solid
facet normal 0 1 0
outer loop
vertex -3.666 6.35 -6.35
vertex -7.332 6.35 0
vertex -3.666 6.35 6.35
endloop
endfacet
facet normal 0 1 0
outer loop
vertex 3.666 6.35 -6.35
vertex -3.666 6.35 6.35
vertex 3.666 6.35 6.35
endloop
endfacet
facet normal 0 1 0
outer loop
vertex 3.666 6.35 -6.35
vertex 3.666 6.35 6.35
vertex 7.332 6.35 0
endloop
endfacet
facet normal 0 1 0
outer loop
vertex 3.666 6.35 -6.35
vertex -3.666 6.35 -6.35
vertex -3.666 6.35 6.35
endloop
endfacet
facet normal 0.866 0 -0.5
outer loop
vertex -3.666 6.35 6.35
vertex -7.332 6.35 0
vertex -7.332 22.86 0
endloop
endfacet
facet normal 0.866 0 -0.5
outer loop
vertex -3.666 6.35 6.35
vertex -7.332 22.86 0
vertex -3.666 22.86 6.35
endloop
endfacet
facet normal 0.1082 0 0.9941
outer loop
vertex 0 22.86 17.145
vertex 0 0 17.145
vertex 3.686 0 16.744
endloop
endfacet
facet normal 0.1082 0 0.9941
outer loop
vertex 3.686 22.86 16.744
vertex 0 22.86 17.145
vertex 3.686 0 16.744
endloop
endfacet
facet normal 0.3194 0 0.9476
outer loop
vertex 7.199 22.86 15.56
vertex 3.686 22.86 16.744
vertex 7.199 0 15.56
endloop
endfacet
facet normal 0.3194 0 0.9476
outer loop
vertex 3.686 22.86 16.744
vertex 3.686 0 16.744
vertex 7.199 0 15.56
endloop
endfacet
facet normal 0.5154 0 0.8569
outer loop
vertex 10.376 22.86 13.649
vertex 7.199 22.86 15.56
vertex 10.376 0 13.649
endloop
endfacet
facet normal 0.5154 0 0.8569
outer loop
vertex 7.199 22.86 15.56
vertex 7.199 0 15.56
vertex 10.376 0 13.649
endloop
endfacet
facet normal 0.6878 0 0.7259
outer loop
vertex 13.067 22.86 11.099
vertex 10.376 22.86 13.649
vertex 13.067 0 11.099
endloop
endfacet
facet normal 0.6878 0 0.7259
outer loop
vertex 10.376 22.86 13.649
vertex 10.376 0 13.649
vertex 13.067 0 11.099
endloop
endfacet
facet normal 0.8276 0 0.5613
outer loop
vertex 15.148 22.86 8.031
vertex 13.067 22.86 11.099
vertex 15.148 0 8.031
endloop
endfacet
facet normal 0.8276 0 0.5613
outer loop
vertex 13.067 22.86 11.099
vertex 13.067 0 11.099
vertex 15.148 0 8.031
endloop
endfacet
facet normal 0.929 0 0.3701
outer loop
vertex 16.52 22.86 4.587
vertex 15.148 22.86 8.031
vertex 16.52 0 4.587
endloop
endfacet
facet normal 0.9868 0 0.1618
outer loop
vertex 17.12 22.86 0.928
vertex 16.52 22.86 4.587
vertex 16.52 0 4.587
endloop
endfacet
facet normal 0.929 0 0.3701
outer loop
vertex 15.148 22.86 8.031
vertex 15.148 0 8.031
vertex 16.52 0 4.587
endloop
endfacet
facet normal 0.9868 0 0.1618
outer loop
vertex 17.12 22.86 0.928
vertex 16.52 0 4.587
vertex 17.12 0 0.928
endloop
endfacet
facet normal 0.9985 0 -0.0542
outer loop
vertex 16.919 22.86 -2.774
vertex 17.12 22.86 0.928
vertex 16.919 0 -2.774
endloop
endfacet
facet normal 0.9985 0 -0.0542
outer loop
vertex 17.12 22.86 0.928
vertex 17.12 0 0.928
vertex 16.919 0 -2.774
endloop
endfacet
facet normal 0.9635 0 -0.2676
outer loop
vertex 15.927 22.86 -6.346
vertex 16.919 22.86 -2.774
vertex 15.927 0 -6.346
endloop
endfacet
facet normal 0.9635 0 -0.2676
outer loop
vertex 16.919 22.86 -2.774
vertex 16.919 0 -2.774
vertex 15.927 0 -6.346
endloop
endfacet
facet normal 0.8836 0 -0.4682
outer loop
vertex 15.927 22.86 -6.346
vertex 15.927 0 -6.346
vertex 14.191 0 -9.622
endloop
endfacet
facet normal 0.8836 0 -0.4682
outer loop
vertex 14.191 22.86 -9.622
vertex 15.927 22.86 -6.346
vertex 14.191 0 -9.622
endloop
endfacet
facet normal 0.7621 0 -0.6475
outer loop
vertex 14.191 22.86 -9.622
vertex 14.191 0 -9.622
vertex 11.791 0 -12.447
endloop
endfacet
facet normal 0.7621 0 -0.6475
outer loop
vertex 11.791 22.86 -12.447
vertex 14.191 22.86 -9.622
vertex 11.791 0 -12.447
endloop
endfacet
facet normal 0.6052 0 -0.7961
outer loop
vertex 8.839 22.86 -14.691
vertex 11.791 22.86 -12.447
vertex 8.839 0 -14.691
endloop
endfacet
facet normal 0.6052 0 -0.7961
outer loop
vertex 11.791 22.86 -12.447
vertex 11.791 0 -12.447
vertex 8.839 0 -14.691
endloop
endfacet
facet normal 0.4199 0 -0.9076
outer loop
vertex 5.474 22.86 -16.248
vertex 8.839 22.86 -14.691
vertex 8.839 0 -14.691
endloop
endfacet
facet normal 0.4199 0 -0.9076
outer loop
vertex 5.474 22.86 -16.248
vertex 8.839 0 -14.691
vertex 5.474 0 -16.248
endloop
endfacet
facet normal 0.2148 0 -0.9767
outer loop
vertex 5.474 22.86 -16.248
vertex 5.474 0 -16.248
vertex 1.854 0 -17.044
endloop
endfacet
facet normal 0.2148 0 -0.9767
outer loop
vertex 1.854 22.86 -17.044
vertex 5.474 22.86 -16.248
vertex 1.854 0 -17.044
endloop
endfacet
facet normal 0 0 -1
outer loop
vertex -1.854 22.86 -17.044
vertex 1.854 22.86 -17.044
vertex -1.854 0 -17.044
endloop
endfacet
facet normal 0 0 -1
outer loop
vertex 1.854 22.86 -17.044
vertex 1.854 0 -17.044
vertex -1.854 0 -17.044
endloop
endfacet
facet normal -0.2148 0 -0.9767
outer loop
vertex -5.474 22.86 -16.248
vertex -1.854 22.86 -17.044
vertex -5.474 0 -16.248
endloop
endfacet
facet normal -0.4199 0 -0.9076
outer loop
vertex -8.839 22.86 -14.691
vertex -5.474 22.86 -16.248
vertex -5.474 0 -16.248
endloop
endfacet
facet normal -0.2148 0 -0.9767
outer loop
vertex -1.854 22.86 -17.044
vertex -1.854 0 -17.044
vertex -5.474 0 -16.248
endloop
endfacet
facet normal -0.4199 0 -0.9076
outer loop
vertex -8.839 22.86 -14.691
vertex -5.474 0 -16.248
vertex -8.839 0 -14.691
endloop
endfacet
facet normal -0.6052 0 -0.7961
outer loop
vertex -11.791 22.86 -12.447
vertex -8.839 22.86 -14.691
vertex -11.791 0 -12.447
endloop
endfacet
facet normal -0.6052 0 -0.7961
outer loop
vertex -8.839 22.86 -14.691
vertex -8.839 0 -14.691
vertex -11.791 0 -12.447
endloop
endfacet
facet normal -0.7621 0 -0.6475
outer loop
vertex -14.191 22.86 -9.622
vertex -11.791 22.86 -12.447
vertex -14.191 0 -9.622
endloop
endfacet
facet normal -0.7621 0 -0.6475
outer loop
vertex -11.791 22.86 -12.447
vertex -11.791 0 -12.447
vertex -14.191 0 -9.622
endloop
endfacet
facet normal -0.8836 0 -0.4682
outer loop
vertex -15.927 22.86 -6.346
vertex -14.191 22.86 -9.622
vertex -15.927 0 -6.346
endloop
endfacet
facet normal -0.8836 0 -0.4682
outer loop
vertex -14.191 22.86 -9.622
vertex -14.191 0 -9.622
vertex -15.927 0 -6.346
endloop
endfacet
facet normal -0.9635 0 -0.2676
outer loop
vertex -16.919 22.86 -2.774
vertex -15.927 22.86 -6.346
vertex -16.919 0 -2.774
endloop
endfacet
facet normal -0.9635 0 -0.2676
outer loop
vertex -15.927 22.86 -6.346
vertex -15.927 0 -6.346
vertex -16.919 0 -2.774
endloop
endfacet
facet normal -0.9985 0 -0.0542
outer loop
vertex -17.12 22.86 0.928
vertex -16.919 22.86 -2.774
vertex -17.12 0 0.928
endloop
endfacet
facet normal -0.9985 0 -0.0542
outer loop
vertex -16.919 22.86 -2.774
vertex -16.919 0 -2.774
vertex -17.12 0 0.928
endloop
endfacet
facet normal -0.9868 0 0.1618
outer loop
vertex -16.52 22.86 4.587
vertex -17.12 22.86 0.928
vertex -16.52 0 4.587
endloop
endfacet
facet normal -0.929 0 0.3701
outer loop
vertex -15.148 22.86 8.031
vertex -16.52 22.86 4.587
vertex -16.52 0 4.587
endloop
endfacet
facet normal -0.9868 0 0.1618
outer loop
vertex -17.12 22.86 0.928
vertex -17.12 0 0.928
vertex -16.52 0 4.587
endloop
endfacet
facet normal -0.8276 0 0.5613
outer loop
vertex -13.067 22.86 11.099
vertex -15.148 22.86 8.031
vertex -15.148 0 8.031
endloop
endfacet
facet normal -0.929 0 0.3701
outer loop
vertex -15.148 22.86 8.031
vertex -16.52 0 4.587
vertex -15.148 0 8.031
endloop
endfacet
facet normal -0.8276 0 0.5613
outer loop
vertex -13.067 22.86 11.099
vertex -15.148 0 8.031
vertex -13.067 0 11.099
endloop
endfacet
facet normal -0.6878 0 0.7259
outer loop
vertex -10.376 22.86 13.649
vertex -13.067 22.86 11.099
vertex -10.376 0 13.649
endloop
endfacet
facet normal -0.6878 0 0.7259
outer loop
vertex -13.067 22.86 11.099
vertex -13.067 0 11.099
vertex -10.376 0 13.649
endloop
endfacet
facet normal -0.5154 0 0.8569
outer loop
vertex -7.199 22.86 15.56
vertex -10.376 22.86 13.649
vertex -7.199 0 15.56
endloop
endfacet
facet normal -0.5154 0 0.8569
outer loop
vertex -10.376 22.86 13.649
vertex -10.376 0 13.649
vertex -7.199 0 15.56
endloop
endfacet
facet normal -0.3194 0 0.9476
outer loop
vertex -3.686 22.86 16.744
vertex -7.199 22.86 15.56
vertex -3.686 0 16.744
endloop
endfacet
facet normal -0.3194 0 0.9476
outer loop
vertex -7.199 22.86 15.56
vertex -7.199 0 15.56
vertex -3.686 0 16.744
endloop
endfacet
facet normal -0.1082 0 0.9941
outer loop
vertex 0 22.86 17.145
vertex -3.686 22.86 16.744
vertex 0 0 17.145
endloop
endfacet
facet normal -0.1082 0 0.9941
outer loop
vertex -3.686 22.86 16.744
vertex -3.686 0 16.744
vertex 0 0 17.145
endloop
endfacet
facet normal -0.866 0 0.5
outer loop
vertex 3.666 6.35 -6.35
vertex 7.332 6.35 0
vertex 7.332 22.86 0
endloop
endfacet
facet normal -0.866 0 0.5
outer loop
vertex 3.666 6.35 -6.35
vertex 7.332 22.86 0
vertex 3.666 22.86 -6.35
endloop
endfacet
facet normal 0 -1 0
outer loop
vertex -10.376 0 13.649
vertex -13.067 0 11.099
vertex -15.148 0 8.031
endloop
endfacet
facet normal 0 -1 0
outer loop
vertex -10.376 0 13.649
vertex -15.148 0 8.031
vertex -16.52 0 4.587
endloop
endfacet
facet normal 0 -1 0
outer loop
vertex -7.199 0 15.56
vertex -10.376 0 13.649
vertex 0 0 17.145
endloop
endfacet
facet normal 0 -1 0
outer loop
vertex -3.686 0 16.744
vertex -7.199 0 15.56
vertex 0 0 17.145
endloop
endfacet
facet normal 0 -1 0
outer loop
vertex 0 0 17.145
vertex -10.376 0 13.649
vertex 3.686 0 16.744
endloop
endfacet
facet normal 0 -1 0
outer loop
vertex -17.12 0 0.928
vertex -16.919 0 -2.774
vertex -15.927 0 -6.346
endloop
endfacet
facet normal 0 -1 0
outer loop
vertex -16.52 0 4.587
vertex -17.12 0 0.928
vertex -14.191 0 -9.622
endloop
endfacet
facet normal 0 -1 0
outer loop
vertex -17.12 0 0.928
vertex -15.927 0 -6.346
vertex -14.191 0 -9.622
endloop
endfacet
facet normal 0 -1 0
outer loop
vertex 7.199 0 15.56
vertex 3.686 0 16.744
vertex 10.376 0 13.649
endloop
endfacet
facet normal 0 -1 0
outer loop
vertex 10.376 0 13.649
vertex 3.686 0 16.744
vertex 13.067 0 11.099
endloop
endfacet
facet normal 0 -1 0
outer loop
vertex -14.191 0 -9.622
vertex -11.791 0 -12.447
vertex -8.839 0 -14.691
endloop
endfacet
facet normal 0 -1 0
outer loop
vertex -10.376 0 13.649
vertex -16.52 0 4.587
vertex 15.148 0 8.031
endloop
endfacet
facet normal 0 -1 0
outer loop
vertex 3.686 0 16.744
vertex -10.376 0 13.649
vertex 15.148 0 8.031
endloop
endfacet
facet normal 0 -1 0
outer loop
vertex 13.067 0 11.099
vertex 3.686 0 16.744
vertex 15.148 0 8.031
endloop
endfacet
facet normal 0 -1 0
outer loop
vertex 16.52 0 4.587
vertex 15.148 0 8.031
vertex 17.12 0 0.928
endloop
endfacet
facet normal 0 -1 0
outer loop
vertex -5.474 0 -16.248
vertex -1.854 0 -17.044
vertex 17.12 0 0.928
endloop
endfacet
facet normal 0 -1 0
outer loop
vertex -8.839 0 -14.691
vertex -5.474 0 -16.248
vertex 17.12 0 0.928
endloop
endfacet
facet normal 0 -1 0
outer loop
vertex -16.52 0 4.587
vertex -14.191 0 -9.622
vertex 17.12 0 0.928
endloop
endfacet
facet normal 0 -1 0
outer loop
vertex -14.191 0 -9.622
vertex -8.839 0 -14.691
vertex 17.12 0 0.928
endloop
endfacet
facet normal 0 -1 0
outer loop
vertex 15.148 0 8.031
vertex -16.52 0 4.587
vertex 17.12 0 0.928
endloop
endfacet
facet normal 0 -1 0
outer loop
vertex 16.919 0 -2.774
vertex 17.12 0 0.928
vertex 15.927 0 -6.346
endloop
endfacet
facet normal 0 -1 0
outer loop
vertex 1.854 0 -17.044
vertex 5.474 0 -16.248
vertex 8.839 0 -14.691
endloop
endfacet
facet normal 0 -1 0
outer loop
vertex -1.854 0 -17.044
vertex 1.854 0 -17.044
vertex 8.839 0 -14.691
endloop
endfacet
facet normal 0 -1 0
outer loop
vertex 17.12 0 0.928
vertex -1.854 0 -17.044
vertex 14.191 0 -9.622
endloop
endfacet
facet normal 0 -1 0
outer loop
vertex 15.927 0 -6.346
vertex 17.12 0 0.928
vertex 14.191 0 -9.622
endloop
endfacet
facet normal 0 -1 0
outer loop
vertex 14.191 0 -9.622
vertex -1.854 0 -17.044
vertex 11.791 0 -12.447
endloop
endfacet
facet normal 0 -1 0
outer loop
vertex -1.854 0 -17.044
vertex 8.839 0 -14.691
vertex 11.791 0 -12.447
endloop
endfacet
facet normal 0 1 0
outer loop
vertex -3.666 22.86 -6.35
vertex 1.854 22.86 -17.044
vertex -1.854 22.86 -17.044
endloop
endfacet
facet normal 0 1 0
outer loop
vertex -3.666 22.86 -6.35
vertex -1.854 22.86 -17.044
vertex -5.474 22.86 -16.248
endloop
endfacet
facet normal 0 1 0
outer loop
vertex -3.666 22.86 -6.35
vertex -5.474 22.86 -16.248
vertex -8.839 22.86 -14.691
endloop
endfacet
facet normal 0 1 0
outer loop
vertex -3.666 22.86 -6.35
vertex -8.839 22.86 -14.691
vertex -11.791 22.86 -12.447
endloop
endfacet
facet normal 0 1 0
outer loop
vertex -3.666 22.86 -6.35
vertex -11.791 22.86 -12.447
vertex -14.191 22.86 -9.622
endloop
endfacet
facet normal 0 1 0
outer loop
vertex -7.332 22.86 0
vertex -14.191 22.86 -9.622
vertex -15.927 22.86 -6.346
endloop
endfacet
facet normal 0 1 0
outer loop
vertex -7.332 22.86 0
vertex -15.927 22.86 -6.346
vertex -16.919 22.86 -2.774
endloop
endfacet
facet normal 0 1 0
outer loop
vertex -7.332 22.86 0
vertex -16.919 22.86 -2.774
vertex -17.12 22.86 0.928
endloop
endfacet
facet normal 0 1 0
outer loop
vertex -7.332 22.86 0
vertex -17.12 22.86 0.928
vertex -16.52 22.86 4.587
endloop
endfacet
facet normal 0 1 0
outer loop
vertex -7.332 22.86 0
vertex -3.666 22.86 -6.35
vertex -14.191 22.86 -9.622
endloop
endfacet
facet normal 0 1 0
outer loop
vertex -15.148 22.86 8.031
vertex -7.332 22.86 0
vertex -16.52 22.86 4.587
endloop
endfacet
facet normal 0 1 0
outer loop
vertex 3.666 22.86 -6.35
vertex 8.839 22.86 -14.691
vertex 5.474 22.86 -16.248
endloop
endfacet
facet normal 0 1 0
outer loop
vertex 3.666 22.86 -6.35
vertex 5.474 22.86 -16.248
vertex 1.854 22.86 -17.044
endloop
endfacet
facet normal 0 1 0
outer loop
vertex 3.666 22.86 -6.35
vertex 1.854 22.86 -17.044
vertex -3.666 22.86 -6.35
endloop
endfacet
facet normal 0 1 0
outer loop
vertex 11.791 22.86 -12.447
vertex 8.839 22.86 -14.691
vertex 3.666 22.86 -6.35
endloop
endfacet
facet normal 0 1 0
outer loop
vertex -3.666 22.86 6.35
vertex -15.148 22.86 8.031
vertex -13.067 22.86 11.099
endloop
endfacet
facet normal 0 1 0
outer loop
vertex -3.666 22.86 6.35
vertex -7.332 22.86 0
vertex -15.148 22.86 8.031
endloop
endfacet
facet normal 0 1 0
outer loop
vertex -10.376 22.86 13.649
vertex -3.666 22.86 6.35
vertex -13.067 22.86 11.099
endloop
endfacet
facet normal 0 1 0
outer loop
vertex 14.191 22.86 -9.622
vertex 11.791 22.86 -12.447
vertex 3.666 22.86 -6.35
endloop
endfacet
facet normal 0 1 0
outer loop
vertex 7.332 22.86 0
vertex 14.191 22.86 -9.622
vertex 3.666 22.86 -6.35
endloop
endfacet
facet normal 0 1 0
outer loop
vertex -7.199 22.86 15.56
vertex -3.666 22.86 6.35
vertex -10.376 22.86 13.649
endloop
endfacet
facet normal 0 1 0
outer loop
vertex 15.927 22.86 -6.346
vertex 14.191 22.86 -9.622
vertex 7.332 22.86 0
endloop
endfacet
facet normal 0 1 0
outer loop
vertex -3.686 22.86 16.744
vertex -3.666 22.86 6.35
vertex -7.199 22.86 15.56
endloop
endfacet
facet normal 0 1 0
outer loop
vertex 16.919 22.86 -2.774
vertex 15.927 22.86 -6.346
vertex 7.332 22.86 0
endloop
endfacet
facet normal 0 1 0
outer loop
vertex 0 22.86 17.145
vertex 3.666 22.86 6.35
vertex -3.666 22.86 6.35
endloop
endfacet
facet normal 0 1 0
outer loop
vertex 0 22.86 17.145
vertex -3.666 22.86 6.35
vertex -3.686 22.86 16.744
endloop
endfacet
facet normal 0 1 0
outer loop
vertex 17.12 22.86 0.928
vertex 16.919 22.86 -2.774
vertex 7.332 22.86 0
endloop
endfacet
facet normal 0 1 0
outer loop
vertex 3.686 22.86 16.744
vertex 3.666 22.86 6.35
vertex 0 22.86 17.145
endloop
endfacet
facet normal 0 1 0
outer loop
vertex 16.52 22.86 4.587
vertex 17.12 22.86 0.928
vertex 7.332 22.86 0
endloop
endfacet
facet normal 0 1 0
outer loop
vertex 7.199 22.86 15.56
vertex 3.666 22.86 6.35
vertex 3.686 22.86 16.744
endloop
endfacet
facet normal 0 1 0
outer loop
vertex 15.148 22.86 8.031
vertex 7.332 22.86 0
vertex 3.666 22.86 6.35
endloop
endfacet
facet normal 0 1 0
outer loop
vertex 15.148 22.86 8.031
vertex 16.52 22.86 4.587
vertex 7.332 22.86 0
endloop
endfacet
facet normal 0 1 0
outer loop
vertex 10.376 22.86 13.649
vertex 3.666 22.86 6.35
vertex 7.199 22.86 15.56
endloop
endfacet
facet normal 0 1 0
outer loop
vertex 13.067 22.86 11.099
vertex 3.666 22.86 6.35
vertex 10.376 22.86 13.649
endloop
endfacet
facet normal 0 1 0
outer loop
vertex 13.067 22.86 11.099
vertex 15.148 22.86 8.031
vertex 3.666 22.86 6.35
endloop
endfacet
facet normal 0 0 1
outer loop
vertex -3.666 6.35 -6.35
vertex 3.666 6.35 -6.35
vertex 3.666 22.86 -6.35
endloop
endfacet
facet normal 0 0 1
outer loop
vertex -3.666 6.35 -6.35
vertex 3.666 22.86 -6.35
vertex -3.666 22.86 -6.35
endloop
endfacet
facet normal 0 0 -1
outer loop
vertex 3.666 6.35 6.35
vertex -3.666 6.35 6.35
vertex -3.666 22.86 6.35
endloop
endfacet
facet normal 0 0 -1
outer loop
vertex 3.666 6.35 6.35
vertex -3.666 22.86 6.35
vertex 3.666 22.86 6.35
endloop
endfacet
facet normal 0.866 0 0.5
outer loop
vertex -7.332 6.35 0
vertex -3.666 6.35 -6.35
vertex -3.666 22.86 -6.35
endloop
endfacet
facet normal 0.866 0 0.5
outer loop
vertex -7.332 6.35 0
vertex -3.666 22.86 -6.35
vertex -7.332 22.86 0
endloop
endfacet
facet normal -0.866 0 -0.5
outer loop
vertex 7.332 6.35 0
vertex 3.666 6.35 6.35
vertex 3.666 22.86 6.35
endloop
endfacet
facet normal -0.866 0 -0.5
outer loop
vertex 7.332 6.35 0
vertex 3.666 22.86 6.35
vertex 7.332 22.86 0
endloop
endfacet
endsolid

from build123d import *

# Parameters (mm, degrees)
SKETCH1_R           = 17.145
BOSS_EXTRUDE1_DEPTH = 22.86
BOSS_EXTRUDE2_DEPTH = 6.35


with BuildPart() as part:
    # Sketch1 → Boss-Extrude1 (new body)
    with BuildSketch(Plane(origin=(0, 0, 0), x_dir=(1, 0, 0), z_dir=(0, 1, 0))):
        Circle(SKETCH1_R)
        Polygon((7.332348419, 0), (3.666174209, 6.35), (-3.666174209, 6.35), (-7.332348419, 0), (-3.666174209, -6.35), (3.666174209, -6.35), align=None, mode=Mode.SUBTRACT)
    extrude(amount=BOSS_EXTRUDE1_DEPTH)

    # Sketch1<2> → Boss-Extrude2 (add)
    with BuildSketch(Plane(origin=(0, 0, 0), x_dir=(1, 0, 0), z_dir=(0, 1, 0))):
        Polygon((3.666174209, -6.35), (7.332348419, 0), (3.666174209, 6.35), (-3.666174209, 6.35), (-7.332348419, 0), (-3.666174209, -6.35), align=None)
    extrude(amount=BOSS_EXTRUDE2_DEPTH)


solid = part.part
